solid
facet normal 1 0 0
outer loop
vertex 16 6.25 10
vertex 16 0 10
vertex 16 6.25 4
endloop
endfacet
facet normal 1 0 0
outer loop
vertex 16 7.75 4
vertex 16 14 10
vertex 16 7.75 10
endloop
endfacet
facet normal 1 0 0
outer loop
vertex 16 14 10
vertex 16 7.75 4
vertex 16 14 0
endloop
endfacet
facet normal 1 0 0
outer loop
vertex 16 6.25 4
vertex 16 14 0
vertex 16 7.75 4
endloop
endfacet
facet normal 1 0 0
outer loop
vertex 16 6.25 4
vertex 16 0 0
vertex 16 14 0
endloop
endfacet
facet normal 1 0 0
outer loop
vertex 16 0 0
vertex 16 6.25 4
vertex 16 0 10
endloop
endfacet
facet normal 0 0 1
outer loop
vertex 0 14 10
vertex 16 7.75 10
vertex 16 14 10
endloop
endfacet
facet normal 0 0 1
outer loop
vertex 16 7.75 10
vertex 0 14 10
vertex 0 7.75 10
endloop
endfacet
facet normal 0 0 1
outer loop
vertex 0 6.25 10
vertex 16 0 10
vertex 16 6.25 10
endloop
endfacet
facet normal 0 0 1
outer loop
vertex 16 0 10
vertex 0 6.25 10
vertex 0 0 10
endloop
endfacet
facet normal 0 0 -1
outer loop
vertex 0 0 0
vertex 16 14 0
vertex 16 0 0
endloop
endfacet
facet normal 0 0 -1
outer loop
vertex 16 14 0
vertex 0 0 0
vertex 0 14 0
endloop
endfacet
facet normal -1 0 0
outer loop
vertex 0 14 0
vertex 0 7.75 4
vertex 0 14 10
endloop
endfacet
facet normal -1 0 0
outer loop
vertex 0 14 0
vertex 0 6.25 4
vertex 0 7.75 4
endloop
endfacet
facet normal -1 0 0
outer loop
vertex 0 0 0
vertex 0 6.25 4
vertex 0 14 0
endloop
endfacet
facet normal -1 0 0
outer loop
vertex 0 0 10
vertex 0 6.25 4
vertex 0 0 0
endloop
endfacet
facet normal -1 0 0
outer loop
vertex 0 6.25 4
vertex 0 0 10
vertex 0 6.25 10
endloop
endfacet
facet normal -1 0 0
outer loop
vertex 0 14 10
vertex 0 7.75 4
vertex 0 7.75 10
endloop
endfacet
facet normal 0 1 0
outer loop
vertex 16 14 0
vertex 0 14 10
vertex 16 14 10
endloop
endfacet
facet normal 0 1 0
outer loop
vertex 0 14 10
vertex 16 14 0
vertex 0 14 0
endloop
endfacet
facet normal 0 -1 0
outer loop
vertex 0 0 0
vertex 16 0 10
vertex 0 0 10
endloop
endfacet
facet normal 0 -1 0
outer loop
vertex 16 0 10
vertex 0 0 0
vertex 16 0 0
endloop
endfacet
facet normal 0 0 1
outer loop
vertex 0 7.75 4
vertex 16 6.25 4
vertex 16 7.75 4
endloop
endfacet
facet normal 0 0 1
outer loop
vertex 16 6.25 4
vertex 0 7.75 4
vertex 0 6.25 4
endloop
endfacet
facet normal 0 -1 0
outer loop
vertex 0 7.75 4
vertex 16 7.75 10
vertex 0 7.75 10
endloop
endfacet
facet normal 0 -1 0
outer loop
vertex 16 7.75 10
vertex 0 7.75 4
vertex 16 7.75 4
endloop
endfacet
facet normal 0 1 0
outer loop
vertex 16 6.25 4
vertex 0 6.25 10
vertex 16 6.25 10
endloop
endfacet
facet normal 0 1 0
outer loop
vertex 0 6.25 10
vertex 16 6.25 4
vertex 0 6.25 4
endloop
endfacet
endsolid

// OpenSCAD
$fn = 32;

// ----------------------------------------------------------------------
// Micro clip: slotted block, 5-20 mm class
// ----------------------------------------------------------------------

// --- parameters (mm) ---
block_l = 16;             // block length, X
block_w = 14;             // block width, Y
block_h = 10;             // block height, Z
slot_w = 1.5;             // slot width
slot_d = 6;               // slot depth from the top

difference() {
  cube([block_l, block_w, block_h]);
  translate([-1, block_w / 2 - slot_w / 2, block_h - slot_d])
    cube([block_l + 2, slot_w, slot_d + 1]);
}
